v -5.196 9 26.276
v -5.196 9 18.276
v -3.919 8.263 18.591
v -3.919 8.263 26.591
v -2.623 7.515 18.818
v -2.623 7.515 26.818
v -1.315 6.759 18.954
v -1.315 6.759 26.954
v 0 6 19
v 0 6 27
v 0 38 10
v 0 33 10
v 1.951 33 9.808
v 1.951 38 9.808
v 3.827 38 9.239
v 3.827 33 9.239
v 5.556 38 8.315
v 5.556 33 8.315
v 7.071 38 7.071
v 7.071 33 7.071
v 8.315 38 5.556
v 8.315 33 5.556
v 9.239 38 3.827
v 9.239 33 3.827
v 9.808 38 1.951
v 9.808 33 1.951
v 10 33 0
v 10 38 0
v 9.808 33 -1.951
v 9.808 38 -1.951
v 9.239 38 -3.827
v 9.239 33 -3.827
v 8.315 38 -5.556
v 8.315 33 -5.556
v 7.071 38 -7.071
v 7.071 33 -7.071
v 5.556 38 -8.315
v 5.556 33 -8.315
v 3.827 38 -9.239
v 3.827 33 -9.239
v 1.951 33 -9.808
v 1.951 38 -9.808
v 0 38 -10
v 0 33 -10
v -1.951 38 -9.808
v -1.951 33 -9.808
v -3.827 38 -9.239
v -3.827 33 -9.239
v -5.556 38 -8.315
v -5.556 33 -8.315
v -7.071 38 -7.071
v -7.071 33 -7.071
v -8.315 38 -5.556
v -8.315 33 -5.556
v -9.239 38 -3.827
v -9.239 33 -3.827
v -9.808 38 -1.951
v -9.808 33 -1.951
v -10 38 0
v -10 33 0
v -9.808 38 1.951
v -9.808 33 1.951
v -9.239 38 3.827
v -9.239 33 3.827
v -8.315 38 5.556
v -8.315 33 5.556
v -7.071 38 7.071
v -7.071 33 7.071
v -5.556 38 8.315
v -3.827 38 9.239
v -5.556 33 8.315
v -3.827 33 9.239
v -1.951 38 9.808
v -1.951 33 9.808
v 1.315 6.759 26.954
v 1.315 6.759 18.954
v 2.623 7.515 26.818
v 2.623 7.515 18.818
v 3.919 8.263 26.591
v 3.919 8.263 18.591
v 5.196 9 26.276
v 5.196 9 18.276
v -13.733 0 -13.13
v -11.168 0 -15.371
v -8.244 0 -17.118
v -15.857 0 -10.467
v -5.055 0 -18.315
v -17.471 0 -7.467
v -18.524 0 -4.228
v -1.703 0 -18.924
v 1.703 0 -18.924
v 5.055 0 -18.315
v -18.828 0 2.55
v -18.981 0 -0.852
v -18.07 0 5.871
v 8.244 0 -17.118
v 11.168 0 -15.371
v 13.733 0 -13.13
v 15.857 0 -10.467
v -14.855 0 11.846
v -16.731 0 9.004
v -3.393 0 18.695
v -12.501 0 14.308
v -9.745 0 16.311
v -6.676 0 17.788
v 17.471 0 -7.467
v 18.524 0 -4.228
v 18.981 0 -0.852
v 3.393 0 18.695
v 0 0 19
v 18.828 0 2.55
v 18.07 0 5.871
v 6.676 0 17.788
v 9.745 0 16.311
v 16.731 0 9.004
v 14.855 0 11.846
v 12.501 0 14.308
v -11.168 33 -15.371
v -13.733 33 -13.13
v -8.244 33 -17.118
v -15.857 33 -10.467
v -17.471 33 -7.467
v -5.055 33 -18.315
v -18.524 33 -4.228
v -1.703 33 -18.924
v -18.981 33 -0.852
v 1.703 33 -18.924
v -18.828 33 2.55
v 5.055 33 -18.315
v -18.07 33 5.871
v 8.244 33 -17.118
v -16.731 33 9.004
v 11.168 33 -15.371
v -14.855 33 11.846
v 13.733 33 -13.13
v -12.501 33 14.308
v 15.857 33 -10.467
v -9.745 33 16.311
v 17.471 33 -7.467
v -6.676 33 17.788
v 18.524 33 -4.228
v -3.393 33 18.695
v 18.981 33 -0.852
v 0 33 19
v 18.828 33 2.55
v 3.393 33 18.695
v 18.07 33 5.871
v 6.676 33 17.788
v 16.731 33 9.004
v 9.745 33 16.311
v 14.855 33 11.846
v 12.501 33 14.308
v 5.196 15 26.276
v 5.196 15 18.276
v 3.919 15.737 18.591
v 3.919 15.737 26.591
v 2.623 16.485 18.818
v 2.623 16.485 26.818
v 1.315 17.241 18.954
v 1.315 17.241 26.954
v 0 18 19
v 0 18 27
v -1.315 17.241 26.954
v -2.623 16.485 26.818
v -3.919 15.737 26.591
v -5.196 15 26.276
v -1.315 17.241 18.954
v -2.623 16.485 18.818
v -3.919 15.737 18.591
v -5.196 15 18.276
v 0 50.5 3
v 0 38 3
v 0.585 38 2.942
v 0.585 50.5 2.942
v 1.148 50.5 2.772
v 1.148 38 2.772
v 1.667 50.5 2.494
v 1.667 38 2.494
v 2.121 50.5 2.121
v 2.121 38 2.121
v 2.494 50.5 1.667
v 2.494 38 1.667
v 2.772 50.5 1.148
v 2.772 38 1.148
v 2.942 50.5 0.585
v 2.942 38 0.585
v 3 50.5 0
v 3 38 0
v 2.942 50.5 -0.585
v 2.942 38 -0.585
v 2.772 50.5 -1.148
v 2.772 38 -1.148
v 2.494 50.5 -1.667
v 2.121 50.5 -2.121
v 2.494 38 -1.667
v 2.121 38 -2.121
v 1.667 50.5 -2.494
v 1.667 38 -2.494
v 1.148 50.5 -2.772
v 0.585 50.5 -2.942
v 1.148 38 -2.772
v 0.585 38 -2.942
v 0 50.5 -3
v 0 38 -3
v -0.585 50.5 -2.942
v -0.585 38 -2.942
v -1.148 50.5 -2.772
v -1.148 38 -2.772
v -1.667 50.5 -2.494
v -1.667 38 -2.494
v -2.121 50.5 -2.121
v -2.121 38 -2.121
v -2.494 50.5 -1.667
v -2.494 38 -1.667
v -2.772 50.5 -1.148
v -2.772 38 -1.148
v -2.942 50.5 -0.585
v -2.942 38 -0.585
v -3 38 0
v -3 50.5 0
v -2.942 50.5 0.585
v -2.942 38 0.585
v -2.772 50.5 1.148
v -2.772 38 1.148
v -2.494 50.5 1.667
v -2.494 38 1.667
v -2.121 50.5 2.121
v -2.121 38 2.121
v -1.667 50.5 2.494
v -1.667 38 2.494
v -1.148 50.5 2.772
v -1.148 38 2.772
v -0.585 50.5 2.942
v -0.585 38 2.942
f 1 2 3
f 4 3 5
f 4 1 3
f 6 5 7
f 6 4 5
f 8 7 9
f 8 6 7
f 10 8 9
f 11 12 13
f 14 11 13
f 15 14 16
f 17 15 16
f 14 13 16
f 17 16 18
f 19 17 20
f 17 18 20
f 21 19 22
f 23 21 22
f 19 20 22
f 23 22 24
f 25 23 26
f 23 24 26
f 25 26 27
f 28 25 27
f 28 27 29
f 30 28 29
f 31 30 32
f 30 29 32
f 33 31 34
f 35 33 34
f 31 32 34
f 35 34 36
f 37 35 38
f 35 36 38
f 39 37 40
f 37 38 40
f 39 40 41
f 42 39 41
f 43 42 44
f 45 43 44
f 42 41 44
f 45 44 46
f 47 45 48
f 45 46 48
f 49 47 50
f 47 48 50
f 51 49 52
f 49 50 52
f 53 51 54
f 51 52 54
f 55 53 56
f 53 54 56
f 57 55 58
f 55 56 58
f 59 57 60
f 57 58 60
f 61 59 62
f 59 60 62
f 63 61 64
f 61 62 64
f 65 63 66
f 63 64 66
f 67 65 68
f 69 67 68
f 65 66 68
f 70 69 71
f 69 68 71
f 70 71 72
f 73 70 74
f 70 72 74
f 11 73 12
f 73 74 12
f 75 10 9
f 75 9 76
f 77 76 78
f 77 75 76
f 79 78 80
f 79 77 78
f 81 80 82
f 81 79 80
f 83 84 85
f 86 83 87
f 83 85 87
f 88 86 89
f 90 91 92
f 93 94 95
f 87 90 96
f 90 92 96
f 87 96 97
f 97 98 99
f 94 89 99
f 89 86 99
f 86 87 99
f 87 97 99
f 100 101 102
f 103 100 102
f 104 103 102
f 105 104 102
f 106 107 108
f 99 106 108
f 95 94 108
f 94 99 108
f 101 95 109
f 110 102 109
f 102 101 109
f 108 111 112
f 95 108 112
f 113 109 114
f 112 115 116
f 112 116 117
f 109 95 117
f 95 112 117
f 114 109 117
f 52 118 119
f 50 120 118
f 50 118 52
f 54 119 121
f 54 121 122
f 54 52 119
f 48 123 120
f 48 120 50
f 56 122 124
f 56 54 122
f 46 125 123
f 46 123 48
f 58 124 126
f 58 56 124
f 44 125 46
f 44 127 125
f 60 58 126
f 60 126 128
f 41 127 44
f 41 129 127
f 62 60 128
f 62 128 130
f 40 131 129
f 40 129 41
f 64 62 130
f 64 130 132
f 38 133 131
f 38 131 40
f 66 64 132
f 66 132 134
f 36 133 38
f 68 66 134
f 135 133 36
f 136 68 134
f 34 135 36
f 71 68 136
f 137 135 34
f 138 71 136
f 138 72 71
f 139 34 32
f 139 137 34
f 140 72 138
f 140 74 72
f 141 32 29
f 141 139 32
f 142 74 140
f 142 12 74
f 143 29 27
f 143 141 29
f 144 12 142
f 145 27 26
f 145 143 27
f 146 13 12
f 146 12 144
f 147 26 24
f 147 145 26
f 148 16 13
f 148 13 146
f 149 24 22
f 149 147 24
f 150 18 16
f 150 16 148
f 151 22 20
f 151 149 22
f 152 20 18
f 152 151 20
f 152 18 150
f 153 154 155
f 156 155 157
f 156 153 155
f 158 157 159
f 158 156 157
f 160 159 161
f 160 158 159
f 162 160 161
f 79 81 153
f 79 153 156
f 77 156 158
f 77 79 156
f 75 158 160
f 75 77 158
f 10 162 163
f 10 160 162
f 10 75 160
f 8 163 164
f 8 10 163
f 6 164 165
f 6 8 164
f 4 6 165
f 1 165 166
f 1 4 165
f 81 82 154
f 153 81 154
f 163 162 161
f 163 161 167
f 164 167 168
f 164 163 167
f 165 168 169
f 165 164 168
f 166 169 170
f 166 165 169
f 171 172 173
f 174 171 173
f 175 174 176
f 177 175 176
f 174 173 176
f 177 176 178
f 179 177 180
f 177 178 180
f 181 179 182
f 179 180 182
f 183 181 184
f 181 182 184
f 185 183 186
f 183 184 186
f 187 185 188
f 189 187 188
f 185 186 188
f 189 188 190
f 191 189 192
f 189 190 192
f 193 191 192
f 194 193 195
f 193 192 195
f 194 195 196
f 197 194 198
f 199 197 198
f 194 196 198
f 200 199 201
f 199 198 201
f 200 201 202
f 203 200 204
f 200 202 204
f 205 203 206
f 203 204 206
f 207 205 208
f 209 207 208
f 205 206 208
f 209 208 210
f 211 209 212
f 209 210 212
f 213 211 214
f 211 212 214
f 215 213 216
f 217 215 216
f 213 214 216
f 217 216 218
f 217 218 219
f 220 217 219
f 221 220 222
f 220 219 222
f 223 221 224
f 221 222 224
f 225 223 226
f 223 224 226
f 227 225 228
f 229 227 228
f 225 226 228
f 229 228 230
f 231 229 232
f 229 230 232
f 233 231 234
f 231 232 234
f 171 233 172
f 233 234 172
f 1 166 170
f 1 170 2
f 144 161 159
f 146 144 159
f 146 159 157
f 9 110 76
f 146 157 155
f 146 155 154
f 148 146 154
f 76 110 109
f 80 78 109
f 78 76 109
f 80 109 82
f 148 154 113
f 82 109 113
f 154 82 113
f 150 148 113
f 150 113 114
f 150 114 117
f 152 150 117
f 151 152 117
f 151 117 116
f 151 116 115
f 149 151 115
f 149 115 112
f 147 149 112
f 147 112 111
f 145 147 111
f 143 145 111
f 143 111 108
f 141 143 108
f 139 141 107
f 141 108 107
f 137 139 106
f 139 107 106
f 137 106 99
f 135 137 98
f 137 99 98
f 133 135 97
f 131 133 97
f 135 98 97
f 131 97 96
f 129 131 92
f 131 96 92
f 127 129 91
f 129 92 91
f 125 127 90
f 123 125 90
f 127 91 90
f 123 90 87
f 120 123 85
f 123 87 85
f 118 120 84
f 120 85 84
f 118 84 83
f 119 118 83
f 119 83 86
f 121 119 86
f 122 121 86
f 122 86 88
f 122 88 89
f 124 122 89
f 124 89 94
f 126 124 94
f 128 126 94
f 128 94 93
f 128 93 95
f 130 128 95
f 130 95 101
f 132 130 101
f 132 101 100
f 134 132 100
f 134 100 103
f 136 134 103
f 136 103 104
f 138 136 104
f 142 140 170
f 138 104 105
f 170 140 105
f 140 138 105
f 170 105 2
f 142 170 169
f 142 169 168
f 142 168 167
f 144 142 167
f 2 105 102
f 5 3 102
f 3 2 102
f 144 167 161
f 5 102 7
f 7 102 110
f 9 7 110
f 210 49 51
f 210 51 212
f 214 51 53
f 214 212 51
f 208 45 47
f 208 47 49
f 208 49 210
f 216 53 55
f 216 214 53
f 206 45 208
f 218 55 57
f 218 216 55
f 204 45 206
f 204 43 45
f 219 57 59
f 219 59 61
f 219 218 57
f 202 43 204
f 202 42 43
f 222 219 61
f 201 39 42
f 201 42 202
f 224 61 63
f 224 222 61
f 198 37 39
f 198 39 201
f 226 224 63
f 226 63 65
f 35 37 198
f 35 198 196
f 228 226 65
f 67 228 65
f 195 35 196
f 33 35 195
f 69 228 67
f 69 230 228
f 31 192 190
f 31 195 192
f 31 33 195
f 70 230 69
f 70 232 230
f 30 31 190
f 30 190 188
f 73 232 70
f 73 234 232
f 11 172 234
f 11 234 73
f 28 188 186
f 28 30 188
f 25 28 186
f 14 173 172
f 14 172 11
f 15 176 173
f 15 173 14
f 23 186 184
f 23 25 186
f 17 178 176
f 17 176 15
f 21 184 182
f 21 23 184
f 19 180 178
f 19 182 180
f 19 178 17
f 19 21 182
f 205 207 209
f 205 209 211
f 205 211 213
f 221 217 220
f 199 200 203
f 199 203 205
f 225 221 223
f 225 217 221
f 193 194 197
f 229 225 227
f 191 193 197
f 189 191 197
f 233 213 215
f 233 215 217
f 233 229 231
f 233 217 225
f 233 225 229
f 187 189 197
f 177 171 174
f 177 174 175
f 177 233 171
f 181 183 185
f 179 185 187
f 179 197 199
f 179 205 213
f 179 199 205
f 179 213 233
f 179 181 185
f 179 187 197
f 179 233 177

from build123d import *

# Parameters (mm, degrees)
CROQUIS1_R                     = 19
SALIENTE_EXTRUIR1_DEPTH        = 33
CROQUIS2_R                     = 10
SALIENTE_EXTRUIR2_DEPTH        = 5
CROQUIS4_R                     = 3
SALIENTE_EXTRUIR3_DEPTH        = 12.5
SALIENTE_EXTRUIR4_REACH        = 67.204
SALIENTE_EXTRUIR4_START_RADIUS = 19
SALIENTE_EXTRUIR4_END_RADIUS   = 19


with BuildPart() as part:
    # Croquis1 → Saliente-Extruir1 (new body)
    with BuildSketch(Plane(origin=(0, 0, 0), x_dir=(1, 0, 0), z_dir=(0, 1, 0))):
        with Locations(Location((0, 0, 0), (0, 0, 270))):
            Circle(CROQUIS1_R)
    extrude(amount=SALIENTE_EXTRUIR1_DEPTH)

    # Croquis2 → Saliente-Extruir2 (add)
    with BuildSketch(Plane(origin=(0, 33, 0), x_dir=(1, 0, 0), z_dir=(0, 1, 0))):
        with Locations(Location((0, 0, 0), (0, 0, 270))):
            Circle(CROQUIS2_R)
    extrude(amount=SALIENTE_EXTRUIR2_DEPTH)

    # Croquis4 → Saliente-Extruir3 (add)
    with BuildSketch(Plane(origin=(0, 38, 0), x_dir=(1, 0, 0), z_dir=(0, 1, 0))):
        with Locations(Location((0, 0, 0), (0, 0, 270))):
            Circle(CROQUIS4_R)
    extrude(amount=SALIENTE_EXTRUIR3_DEPTH)

    # Saliente-Extruir4: from a cylinder face, 67.204 long prism both ways, kept between that surface and its translate by the depth
    saliente_extruir4_start = Plane(origin=(0, 12, 0), z_dir=(0, -1, 0)) * Cylinder(SALIENTE_EXTRUIR4_START_RADIUS, 173.408, mode=Mode.PRIVATE)
    saliente_extruir4_end = Plane(origin=(0, 12, 8), z_dir=(0, -1, 0)) * Cylinder(SALIENTE_EXTRUIR4_END_RADIUS, 173.408, mode=Mode.PRIVATE)
    # Croquis6 → Saliente-Extruir4 (add, from a surface)
    with BuildSketch(Plane.XY, mode=Mode.PRIVATE) as saliente_extruir4_sk1:
        Polygon((-5.196152423, 15), (-5.196152423, 9), (0, 6), (5.196152423, 9), (5.196152423, 15), (0, 18), align=None)
    saliente_extruir4_tool1 = extrude(saliente_extruir4_sk1.sketch, amount=SALIENTE_EXTRUIR4_REACH, both=True, mode=Mode.PRIVATE)
    add(((saliente_extruir4_tool1 - saliente_extruir4_start) & saliente_extruir4_end).solids().sort_by_distance((0, 12, 22.637833))[0])


solid = part.part
